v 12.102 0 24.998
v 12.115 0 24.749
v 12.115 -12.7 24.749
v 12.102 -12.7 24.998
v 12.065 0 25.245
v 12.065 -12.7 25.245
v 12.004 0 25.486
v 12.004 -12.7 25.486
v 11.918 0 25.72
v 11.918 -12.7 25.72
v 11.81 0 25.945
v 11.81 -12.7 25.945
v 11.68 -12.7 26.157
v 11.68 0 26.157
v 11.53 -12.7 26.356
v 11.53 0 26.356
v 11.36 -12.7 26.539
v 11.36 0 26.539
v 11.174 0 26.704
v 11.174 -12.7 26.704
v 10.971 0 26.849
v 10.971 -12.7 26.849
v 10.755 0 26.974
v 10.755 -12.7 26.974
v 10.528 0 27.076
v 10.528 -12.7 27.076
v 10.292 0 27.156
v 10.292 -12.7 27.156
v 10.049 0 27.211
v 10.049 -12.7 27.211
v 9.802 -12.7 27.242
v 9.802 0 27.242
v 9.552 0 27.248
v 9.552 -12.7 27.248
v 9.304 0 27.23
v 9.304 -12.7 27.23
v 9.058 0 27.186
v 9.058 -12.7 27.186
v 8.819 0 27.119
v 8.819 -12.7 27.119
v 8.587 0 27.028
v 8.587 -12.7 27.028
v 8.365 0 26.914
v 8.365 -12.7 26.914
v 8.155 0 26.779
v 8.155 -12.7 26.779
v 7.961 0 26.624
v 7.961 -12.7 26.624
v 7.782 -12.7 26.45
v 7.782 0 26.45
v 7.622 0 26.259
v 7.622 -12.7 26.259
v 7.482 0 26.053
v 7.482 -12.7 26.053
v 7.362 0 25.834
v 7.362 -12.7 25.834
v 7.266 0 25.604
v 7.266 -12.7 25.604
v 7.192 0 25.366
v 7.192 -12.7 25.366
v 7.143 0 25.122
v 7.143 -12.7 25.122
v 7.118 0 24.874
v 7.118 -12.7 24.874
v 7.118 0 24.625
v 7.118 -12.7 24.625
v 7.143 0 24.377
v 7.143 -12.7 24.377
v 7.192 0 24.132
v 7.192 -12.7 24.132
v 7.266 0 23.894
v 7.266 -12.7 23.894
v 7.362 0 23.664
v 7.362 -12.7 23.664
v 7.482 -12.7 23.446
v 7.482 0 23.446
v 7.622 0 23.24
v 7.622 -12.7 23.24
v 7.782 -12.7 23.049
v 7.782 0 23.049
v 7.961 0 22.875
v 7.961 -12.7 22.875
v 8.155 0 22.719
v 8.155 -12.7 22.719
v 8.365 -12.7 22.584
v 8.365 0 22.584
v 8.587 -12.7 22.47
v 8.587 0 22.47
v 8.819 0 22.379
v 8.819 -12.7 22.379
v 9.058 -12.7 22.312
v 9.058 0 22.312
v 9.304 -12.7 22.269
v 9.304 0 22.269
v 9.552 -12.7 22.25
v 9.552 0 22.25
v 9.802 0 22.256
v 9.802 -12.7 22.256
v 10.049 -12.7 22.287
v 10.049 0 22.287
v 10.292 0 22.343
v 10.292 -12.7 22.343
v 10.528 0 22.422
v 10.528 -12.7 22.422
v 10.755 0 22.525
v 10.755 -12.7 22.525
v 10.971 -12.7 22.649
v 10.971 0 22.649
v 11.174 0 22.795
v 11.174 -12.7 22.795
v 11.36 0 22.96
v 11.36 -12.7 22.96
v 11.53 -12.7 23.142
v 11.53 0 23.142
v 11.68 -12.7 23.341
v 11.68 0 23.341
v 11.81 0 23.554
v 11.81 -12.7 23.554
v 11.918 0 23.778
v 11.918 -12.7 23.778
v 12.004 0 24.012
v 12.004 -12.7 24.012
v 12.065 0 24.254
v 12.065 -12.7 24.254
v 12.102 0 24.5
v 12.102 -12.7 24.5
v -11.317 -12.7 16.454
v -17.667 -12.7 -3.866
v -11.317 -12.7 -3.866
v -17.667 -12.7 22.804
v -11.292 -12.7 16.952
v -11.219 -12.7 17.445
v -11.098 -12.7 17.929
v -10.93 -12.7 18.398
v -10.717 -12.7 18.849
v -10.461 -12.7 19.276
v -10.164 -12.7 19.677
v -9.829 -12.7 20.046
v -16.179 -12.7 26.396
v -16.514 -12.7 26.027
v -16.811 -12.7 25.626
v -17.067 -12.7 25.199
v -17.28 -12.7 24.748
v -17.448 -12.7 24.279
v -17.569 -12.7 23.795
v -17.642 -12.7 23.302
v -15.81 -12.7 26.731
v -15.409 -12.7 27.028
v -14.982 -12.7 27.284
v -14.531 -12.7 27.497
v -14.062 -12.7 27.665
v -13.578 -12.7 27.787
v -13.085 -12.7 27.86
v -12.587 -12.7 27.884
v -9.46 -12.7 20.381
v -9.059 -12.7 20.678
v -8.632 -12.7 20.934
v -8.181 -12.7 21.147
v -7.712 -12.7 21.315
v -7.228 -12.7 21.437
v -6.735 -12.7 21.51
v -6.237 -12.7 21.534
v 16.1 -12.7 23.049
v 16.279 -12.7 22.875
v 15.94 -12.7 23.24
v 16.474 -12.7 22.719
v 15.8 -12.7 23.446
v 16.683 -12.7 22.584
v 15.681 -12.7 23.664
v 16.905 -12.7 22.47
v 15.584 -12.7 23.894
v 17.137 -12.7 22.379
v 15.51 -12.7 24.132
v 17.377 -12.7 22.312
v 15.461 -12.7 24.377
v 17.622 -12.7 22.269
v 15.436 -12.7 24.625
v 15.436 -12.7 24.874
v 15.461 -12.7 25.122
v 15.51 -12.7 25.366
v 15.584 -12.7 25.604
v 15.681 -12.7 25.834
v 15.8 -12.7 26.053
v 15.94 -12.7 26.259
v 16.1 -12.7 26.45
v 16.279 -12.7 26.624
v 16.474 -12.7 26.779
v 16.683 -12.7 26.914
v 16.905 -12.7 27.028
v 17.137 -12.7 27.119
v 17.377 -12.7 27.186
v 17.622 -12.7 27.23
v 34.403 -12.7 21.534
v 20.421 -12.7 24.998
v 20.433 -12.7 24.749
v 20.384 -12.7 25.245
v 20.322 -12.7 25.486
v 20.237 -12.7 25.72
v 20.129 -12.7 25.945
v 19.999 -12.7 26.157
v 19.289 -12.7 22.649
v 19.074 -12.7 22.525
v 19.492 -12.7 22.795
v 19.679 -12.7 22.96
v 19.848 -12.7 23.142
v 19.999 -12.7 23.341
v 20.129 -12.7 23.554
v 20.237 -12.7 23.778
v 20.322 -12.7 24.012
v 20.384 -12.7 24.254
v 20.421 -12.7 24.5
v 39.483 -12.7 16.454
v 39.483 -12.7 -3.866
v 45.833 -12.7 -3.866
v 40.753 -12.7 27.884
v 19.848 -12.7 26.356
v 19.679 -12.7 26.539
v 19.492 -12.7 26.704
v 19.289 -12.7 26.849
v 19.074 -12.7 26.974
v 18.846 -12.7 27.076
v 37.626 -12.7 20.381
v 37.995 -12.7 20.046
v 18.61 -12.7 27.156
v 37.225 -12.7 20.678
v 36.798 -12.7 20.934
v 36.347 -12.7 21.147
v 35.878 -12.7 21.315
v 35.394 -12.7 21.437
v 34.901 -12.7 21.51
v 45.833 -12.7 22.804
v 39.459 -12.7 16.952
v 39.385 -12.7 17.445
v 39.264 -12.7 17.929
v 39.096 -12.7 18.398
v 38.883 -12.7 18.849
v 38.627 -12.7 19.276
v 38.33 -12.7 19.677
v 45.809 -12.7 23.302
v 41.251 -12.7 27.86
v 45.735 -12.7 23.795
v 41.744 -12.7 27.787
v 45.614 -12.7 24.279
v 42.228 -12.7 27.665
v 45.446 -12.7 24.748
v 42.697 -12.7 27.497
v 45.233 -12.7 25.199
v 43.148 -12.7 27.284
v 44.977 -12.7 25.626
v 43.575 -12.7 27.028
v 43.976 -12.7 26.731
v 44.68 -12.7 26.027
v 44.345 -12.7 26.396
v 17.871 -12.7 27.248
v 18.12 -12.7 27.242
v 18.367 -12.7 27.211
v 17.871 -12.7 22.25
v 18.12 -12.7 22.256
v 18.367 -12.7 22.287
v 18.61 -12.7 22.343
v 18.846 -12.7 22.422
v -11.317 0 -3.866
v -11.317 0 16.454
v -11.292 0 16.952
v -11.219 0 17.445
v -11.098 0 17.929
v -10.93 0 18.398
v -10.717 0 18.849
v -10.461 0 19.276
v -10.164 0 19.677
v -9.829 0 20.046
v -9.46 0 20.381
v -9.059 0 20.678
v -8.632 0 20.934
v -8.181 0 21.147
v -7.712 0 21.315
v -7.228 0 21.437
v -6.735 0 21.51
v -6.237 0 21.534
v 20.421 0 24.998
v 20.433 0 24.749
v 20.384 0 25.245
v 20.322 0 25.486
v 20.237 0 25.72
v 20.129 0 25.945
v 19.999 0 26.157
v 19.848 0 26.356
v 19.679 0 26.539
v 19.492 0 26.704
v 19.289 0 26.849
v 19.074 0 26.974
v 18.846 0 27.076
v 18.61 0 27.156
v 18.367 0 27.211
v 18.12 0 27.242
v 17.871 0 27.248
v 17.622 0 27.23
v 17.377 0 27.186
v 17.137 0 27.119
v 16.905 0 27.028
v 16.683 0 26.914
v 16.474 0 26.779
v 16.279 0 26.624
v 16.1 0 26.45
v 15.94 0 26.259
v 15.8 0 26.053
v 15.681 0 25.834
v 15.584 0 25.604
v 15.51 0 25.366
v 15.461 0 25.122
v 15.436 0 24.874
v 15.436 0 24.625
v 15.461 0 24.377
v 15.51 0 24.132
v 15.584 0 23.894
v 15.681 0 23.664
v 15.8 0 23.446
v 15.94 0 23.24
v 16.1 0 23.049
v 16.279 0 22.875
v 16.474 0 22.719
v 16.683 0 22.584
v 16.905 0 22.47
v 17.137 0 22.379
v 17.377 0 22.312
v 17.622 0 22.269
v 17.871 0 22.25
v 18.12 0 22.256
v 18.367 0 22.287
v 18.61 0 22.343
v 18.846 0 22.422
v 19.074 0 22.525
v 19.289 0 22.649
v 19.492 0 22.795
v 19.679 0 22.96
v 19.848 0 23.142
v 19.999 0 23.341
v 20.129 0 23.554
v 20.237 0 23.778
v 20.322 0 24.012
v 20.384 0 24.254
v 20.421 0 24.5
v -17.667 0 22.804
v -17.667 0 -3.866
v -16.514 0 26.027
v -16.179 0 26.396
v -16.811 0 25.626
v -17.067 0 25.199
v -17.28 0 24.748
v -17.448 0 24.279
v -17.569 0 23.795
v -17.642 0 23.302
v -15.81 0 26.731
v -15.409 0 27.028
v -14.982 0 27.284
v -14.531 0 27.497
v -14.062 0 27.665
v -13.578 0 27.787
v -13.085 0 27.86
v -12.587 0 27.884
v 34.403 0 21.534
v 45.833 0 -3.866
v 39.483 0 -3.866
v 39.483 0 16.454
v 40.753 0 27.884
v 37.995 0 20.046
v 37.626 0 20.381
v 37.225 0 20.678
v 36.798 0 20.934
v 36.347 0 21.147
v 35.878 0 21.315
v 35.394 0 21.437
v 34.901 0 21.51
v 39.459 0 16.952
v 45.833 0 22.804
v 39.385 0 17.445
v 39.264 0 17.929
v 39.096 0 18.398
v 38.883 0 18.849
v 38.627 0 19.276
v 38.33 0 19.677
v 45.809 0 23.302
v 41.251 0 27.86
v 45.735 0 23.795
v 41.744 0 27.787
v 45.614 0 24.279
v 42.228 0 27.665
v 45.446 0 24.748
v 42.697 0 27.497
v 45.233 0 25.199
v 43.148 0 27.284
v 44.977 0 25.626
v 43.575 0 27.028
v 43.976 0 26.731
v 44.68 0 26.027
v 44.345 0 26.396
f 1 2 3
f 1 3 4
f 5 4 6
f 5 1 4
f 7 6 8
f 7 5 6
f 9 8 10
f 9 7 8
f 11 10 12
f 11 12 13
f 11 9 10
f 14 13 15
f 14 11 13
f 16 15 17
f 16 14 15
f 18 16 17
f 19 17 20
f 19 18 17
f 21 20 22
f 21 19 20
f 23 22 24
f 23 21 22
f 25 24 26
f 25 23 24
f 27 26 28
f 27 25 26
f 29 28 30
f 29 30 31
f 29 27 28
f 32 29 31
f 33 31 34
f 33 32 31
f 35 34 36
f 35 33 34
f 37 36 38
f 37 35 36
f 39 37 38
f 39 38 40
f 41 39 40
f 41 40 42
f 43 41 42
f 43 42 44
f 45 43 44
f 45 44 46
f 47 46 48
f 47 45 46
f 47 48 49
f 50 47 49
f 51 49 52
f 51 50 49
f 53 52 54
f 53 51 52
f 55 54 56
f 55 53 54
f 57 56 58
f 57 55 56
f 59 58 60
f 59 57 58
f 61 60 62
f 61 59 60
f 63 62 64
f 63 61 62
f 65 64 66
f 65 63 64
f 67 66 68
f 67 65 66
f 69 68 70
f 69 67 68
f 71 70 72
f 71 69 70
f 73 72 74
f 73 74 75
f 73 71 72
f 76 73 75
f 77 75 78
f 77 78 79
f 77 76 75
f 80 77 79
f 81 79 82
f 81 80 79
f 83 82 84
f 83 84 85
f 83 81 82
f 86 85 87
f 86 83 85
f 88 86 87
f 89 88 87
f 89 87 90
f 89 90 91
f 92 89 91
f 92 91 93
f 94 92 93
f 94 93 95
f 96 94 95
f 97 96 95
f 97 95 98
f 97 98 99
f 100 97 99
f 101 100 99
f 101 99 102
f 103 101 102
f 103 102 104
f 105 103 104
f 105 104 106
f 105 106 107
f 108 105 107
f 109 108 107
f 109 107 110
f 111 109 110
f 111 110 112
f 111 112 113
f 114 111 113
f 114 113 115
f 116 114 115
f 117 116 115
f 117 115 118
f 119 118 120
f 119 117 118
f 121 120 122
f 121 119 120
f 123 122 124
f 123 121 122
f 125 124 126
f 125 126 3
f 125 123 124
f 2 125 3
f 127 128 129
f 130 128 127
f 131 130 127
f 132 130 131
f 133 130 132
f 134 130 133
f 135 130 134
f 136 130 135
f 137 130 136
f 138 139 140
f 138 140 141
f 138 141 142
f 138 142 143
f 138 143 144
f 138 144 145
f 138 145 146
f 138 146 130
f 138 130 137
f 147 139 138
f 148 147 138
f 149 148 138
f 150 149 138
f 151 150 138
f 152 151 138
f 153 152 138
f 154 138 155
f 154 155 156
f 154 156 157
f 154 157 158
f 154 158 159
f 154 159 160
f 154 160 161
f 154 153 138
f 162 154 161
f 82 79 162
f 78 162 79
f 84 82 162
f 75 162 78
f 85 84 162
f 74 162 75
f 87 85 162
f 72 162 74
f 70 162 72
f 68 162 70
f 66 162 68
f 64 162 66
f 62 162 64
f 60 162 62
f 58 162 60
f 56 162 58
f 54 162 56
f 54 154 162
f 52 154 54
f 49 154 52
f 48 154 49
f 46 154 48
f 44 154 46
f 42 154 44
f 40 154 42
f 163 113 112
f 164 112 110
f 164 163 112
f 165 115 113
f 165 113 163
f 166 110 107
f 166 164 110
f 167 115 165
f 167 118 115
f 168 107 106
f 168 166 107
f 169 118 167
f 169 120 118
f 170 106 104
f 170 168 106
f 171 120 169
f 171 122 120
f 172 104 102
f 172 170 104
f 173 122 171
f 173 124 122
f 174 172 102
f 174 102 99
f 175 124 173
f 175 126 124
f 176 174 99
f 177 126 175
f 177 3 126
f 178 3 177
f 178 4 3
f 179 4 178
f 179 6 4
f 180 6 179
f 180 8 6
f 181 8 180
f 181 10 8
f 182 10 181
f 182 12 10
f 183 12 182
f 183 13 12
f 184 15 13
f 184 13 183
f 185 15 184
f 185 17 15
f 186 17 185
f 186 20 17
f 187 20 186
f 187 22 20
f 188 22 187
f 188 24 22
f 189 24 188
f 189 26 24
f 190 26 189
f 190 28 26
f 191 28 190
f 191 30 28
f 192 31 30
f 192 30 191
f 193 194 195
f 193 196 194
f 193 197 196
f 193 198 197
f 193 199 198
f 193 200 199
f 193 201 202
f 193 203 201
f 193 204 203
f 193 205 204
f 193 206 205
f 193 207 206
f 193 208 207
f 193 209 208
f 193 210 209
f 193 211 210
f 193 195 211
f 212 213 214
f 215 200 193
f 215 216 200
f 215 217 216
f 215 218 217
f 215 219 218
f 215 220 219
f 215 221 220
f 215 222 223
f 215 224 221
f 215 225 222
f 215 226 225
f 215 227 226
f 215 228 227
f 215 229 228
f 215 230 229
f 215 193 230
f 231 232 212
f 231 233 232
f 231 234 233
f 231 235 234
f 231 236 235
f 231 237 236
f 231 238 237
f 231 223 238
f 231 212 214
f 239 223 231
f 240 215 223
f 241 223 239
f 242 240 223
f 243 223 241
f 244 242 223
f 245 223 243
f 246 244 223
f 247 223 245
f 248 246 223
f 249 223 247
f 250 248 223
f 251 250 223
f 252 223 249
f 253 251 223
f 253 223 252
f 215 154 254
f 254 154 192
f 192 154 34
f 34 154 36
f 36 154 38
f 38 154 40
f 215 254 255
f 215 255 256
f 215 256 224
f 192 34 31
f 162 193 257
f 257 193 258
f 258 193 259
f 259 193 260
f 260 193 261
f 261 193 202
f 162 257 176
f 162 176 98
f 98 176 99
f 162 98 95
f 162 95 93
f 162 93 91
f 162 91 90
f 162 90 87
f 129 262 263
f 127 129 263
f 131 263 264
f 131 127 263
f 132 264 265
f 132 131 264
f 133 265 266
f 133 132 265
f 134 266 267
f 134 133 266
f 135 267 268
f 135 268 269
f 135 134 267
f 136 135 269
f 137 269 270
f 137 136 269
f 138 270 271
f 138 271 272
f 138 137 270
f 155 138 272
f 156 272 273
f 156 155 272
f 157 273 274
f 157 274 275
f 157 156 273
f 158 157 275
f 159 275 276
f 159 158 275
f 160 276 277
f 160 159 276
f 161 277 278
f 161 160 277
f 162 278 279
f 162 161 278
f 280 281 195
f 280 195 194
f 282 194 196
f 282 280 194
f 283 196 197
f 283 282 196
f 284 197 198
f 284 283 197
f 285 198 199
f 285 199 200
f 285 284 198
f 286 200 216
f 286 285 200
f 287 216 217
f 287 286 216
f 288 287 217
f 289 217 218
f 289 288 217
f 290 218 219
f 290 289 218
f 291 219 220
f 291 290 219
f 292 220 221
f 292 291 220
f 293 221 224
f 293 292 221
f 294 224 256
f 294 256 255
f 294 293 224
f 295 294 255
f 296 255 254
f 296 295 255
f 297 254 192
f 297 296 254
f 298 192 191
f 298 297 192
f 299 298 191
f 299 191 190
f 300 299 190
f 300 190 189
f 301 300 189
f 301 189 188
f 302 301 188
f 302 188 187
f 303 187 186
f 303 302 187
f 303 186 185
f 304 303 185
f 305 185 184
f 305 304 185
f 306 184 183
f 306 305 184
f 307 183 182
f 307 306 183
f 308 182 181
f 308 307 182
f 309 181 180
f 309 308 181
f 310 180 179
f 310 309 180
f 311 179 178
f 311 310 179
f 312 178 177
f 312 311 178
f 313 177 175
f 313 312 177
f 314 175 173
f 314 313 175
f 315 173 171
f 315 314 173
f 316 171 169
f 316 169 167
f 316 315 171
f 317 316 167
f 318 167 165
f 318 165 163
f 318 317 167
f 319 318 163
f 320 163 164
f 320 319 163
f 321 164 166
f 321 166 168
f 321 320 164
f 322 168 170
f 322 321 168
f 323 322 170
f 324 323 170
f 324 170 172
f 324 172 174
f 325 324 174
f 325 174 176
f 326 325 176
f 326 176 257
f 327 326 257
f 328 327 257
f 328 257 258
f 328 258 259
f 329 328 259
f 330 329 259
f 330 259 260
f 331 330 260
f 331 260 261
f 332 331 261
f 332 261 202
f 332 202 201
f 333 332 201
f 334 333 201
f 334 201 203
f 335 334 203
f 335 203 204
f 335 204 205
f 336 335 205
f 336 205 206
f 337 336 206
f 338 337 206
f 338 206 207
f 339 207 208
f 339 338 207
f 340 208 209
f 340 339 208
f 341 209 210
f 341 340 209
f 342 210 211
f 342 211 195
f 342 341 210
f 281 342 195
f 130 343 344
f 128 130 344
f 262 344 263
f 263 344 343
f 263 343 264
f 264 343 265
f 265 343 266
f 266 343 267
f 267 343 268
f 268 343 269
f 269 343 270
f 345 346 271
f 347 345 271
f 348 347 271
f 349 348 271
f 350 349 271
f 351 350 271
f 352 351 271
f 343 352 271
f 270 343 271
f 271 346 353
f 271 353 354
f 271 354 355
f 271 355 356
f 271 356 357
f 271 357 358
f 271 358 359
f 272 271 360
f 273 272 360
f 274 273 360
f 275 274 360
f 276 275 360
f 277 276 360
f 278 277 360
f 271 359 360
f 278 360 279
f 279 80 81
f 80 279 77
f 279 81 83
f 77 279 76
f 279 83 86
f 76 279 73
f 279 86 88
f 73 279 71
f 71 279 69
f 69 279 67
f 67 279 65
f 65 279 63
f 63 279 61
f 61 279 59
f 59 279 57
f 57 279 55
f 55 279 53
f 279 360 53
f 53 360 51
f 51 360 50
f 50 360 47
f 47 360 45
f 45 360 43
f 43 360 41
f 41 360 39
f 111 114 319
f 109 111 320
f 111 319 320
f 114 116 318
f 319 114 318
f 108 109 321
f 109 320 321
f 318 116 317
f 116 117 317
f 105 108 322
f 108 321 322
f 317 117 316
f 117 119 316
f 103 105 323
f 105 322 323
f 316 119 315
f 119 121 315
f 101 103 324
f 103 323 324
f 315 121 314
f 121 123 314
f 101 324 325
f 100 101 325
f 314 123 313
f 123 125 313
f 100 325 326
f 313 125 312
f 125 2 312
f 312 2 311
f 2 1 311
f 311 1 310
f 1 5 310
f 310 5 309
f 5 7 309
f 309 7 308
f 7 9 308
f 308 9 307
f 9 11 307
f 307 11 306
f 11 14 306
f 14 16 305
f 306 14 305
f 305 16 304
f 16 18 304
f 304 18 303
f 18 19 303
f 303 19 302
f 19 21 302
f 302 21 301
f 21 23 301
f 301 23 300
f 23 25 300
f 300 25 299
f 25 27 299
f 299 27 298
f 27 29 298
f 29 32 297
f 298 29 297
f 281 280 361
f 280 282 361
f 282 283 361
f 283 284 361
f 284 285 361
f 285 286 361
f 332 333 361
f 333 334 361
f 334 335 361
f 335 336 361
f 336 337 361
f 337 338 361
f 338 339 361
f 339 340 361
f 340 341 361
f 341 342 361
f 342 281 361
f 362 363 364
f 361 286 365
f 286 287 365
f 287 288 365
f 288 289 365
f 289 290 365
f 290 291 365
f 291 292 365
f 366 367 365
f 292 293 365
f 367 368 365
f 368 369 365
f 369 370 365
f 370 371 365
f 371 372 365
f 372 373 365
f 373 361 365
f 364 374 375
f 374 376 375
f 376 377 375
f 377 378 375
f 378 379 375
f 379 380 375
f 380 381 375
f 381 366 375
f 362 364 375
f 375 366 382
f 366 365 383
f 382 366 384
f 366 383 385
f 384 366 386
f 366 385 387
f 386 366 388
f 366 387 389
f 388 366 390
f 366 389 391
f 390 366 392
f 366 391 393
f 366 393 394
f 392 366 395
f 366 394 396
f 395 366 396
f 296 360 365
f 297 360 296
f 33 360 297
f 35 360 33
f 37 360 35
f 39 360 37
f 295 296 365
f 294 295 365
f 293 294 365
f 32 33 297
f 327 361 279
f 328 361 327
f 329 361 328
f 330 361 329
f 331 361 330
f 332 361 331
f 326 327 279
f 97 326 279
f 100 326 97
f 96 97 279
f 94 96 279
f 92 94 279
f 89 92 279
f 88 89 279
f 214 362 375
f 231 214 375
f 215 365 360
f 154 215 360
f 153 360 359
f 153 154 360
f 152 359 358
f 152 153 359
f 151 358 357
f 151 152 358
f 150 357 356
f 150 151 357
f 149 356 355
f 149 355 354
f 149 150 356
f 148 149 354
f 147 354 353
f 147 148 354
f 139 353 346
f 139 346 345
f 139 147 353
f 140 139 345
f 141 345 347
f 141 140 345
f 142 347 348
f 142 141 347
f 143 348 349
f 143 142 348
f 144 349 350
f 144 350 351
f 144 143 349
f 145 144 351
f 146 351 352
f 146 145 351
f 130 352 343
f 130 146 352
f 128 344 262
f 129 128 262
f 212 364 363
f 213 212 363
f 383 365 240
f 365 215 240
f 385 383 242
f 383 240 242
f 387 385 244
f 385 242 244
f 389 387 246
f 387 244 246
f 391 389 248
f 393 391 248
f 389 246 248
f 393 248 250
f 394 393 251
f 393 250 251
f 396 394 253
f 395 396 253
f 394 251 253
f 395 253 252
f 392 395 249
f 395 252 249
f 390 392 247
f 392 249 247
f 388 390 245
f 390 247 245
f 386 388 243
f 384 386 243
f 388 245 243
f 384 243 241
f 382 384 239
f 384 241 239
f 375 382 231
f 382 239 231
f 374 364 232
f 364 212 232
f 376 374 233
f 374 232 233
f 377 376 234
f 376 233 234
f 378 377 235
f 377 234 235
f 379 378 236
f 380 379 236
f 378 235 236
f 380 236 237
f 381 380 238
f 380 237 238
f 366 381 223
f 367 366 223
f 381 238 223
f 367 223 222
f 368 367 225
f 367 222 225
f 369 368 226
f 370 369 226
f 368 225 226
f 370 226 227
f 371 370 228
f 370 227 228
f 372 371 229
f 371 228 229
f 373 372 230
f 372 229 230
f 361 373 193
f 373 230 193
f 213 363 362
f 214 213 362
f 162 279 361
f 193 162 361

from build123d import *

# Parameters (mm, degrees)
F0_R     = 2.499995
F1_DEPTH = 12.7
F2_R     = 5.08


with BuildPart() as f1:
    # F0 (on Front) → F1 (new body)
    with BuildSketch(Plane.XZ):
        Polygon((45.833084, 27.884173), (-17.666916, 27.884173), (-17.666916, -3.865827), (-11.316916, -3.865827), (-11.316916, 21.534173), (39.483084, 21.534173), (39.483084, -3.865827), (45.833084, -3.865827), align=None)
        with Locations((9.614785, 24.749178)):
            Circle(F0_R, mode=Mode.SUBTRACT)
        with Locations((17.933089, 24.749178)):
            Circle(F0_R, mode=Mode.SUBTRACT)
    extrude(amount=F1_DEPTH)

    # F2
    f2_edges = [f1.edges().sort_by_distance(p)[0] for p in [
        (-17.666916, -6.35, 27.884173),
        (-11.316916, -6.35, 21.534173),
        (45.833084, -6.35, 27.884173),
        (39.483084, -6.35, 21.534173),
    ]]
    fillet(f2_edges, radius=F2_R)


solid = f1.part
